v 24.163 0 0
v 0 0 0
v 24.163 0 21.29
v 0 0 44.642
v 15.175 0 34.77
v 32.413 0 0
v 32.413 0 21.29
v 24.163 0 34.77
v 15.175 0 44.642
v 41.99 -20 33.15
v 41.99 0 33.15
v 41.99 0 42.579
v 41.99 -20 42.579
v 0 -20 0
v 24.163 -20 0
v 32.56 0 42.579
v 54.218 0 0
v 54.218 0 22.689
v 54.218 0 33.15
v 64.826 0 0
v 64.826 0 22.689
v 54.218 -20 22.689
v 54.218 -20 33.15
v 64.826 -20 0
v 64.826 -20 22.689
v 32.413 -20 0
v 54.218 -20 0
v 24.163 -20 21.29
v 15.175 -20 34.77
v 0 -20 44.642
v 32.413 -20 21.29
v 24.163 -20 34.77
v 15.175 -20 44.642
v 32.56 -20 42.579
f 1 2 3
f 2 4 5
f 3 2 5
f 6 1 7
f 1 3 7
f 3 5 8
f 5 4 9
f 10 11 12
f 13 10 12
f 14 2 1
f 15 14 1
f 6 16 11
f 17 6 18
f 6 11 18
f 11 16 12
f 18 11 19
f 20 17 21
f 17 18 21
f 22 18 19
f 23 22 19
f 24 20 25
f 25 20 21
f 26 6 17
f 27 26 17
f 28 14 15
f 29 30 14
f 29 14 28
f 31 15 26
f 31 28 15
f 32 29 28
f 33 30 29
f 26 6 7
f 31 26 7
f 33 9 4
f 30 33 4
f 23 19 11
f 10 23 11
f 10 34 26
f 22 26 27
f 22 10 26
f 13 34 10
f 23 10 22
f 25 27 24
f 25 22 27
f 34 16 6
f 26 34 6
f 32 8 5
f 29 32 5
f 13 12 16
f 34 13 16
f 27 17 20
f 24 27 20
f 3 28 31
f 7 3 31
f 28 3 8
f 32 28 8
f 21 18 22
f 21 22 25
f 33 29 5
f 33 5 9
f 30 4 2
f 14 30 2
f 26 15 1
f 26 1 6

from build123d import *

# Parameters (mm, degrees)
F0_W     = 8.250609
F0_H     = 21.289527
F0_W_2   = 10.607928
F0_H_2   = 22.689193
F1_DEPTH = 20


with BuildPart() as f1:
    # F0 (on Front) → F1 (new body)
    with BuildSketch(Plane.XZ):
        Polygon((0, 44.641711), (0, 0), (15.175223, 0), (15.175223, 34.770444), (15.175223, 44.641711), align=None)
        Polygon((32.560438, 42.579055), (32.41311, 0), (41.989714, 0), (41.989714, 33.149786), (41.989714, 42.579055), align=None)
        Polygon((15.175223, 34.770444), (15.175223, 0), (24.162501, 0), (24.162501, 21.289527), (24.162501, 34.770444), align=None)
        with Locations((28.287805, 10.644763)):
            Rectangle(F0_W, F0_H)
        Polygon((41.989714, 33.149786), (41.989714, 0), (54.218292, 0), (54.218292, 22.689193), (54.218292, 33.149786), align=None)
        with Locations((59.522256, 11.344596)):
            Rectangle(F0_W_2, F0_H_2)
    extrude(amount=F1_DEPTH)


solid = f1.part
